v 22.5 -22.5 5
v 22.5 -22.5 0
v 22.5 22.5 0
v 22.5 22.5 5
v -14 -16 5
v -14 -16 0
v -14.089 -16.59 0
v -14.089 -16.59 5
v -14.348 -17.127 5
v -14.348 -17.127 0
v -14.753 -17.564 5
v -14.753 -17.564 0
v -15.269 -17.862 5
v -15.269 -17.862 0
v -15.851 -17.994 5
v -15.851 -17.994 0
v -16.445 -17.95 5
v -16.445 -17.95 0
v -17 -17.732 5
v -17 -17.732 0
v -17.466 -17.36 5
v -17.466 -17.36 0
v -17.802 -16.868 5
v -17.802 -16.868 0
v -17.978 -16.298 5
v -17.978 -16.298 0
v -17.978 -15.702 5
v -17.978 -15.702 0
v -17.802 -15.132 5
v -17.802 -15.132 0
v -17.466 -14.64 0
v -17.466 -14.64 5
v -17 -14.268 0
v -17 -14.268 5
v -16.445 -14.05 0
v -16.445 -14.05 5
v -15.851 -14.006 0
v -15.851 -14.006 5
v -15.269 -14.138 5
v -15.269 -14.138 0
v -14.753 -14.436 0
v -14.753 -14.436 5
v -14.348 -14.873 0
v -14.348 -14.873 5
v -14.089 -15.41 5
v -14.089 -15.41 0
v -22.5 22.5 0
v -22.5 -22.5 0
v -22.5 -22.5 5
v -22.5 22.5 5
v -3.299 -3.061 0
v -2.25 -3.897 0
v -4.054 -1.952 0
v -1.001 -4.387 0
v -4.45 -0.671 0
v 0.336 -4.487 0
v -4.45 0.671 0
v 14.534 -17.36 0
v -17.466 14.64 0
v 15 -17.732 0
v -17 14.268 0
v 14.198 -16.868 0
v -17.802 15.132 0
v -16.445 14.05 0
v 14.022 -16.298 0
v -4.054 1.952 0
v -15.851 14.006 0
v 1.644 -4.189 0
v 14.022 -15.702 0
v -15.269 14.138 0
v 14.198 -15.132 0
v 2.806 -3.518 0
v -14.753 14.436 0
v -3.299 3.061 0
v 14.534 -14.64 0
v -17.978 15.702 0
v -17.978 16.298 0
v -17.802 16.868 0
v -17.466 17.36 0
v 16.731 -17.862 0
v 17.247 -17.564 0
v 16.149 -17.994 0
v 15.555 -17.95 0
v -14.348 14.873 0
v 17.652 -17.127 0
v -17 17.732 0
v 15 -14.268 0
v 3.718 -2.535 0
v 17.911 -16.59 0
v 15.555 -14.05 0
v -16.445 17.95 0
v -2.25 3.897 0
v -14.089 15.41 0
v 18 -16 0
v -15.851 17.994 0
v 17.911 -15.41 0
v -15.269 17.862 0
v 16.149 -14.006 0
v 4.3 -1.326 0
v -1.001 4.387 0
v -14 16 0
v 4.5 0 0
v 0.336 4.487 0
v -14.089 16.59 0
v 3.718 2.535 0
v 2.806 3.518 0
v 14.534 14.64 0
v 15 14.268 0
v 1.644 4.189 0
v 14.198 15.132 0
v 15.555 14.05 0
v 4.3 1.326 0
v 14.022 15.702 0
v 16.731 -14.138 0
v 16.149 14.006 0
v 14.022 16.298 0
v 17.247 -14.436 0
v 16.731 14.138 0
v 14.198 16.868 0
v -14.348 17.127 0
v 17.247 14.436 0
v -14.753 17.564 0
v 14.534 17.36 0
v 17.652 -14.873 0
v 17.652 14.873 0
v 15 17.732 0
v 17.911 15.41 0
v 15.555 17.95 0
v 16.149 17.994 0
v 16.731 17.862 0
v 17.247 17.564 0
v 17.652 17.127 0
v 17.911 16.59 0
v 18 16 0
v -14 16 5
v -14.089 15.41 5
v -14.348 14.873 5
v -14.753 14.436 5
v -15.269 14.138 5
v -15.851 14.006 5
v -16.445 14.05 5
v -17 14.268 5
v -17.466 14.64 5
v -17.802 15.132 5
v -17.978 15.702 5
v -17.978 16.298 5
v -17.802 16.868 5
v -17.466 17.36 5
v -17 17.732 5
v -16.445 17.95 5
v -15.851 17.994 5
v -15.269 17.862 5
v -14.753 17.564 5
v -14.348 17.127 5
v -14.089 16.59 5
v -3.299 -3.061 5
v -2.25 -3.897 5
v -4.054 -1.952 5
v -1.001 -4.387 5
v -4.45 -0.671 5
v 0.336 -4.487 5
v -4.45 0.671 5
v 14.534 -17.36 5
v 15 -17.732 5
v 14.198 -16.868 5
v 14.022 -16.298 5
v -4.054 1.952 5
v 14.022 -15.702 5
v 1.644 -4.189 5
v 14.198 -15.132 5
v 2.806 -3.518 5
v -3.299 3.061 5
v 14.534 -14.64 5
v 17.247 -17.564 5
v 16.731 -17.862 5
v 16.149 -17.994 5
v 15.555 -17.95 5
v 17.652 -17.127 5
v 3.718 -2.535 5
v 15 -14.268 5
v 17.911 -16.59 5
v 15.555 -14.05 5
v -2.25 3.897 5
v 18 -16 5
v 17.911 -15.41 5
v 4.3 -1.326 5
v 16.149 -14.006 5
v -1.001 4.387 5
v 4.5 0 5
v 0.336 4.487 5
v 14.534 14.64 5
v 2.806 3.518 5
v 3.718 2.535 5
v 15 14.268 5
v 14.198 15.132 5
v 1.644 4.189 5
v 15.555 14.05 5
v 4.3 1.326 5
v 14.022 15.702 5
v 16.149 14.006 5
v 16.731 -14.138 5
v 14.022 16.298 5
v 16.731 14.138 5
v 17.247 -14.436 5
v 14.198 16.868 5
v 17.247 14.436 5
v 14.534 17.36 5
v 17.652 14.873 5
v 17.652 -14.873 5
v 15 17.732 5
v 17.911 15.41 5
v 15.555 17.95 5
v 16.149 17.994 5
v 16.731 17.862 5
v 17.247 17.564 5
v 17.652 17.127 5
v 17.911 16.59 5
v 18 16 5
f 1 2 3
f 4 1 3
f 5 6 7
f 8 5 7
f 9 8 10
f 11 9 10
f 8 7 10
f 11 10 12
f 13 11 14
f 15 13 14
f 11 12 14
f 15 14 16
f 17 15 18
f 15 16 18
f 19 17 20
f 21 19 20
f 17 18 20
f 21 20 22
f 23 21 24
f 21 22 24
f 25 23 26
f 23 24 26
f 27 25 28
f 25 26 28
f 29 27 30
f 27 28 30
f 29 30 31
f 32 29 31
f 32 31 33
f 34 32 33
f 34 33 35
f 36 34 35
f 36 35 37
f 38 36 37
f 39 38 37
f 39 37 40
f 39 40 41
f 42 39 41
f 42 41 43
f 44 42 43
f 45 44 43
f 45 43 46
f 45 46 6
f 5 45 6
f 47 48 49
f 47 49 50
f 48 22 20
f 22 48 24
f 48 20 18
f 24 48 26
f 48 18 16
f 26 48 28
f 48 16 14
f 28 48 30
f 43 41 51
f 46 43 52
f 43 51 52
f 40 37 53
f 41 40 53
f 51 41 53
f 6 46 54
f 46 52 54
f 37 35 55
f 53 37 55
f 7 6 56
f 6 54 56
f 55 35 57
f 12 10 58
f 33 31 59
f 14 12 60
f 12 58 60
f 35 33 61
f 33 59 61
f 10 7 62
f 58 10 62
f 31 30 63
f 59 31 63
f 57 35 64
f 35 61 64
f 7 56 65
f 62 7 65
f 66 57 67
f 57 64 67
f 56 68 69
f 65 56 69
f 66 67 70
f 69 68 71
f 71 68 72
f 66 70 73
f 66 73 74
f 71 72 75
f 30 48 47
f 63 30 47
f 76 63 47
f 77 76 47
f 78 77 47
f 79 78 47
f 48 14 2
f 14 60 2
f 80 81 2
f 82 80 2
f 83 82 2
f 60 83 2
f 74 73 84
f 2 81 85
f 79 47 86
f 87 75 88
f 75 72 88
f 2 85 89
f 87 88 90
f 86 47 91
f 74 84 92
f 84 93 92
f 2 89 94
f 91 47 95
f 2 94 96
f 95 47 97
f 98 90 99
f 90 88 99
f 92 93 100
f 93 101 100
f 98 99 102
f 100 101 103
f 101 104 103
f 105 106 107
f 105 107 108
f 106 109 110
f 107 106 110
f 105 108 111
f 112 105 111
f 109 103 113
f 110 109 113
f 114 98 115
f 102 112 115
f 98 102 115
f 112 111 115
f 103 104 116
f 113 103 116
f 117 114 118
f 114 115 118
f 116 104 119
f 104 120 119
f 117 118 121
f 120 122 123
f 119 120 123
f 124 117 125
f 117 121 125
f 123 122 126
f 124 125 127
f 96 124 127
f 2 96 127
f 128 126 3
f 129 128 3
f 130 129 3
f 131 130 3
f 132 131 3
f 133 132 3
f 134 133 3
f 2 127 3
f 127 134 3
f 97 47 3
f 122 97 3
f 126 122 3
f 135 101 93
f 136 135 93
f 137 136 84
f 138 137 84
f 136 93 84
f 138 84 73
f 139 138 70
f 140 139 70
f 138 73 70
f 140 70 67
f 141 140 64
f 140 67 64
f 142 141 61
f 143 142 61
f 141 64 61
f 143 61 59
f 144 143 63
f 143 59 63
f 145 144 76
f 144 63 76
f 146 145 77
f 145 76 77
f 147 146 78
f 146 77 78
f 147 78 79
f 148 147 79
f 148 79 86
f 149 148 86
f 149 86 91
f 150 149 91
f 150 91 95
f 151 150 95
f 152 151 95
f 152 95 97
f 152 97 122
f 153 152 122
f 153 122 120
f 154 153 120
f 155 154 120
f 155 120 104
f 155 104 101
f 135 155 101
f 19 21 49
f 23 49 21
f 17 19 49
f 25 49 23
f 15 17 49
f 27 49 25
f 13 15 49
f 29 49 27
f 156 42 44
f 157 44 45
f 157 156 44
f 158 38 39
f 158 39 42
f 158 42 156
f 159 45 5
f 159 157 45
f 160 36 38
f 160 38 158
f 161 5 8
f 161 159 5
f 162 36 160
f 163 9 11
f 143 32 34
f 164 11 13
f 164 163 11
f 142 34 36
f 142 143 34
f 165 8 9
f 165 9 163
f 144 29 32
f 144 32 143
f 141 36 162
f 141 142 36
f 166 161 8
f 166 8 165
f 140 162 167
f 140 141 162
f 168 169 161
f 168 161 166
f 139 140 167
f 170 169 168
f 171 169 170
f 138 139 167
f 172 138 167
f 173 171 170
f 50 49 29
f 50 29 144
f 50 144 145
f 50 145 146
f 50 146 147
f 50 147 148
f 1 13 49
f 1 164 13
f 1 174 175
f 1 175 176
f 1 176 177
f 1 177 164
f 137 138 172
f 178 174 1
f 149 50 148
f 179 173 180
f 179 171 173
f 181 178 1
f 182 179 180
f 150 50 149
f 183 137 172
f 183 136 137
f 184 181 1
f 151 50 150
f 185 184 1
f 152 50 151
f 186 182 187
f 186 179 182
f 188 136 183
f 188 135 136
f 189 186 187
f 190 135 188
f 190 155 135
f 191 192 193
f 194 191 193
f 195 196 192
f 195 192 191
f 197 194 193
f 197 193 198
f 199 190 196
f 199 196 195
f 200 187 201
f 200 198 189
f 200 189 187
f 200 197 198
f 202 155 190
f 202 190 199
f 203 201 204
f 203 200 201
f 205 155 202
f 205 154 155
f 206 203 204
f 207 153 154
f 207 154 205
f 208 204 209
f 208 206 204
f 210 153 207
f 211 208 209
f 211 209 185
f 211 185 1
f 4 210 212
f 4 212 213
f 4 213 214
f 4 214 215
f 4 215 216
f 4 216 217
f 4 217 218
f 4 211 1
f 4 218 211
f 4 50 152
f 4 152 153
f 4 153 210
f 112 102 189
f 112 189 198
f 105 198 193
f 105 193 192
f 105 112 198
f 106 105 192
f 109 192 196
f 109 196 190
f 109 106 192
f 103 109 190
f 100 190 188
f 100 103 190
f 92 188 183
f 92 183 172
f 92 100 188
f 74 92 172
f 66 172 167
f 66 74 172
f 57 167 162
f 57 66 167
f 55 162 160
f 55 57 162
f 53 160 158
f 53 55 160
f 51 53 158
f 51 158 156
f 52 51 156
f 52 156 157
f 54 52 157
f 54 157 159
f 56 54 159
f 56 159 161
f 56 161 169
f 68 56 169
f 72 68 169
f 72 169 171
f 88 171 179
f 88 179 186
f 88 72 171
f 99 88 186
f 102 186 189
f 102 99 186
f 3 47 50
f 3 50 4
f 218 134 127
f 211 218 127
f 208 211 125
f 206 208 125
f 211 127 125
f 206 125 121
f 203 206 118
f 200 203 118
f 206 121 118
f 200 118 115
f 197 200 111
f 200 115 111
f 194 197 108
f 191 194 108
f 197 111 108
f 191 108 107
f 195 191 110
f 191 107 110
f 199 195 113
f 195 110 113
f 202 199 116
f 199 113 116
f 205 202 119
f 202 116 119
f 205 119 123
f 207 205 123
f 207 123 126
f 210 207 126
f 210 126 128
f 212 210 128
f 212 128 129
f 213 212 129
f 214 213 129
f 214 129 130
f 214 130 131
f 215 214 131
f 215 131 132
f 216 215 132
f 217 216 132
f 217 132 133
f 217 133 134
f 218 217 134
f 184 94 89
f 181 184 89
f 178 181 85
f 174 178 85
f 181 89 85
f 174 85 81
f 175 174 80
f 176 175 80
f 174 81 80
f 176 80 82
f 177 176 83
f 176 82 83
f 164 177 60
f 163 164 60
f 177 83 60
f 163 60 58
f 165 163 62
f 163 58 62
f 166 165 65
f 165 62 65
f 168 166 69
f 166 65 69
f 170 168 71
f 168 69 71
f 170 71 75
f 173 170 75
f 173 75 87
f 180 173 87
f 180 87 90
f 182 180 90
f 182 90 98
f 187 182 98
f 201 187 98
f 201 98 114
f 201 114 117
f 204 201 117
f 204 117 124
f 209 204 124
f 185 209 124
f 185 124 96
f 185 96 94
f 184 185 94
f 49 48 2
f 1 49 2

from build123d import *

# Parameters (mm, degrees)
SKETCH1_W           = 45
SKETCH1_H           = 45
SKETCH1_R           = 4.5
BOSS_EXTRUDE1_DEPTH = 5
CUT_EXTRUDE1_DEPTH  = 532.736885204


with BuildPart() as part:
    # Sketch1 → Boss-Extrude1 (new body)
    with BuildSketch(Plane.XY):
        Rectangle(SKETCH1_W, SKETCH1_H)
        Circle(SKETCH1_R, mode=Mode.SUBTRACT)
    extrude(amount=BOSS_EXTRUDE1_DEPTH)

    # Sketch2 → Cut-Extrude1 (cut, through all)
    with BuildSketch(Plane(origin=(-496.037536649, -95.134766003, 0), x_dir=(-1, 0, 0), z_dir=(0, 0, -1))):
        with BuildLine():
            ThreePointArc((-510.037536649, 79.134766003), (-512.037536649, 81.134766003), (-514.037536649, 79.134766003))
            ThreePointArc((-514.037536649, 79.134766003), (-512.037536649, 77.134766003), (-510.037536649, 79.134766003))
        make_face()
        with BuildLine():
            ThreePointArc((-478.037536649, 79.134766003), (-480.037536649, 81.134766003), (-482.037536649, 79.134766003))
            ThreePointArc((-482.037536649, 79.134766003), (-480.037536649, 77.134766003), (-478.037536649, 79.134766003))
        make_face()
        with BuildLine():
            ThreePointArc((-478.037536649, 111.134766003), (-480.037536649, 113.134766003), (-482.037536649, 111.134766003))
            ThreePointArc((-482.037536649, 111.134766003), (-480.037536649, 109.134766003), (-478.037536649, 111.134766003))
        make_face()
        with BuildLine():
            ThreePointArc((-510.037536649, 111.134766003), (-512.037536649, 113.134766003), (-514.037536649, 111.134766003))
            ThreePointArc((-514.037536649, 111.134766003), (-512.037536649, 109.134766003), (-510.037536649, 111.134766003))
        make_face()
    extrude(amount=-CUT_EXTRUDE1_DEPTH, mode=Mode.SUBTRACT)


solid = part.part
